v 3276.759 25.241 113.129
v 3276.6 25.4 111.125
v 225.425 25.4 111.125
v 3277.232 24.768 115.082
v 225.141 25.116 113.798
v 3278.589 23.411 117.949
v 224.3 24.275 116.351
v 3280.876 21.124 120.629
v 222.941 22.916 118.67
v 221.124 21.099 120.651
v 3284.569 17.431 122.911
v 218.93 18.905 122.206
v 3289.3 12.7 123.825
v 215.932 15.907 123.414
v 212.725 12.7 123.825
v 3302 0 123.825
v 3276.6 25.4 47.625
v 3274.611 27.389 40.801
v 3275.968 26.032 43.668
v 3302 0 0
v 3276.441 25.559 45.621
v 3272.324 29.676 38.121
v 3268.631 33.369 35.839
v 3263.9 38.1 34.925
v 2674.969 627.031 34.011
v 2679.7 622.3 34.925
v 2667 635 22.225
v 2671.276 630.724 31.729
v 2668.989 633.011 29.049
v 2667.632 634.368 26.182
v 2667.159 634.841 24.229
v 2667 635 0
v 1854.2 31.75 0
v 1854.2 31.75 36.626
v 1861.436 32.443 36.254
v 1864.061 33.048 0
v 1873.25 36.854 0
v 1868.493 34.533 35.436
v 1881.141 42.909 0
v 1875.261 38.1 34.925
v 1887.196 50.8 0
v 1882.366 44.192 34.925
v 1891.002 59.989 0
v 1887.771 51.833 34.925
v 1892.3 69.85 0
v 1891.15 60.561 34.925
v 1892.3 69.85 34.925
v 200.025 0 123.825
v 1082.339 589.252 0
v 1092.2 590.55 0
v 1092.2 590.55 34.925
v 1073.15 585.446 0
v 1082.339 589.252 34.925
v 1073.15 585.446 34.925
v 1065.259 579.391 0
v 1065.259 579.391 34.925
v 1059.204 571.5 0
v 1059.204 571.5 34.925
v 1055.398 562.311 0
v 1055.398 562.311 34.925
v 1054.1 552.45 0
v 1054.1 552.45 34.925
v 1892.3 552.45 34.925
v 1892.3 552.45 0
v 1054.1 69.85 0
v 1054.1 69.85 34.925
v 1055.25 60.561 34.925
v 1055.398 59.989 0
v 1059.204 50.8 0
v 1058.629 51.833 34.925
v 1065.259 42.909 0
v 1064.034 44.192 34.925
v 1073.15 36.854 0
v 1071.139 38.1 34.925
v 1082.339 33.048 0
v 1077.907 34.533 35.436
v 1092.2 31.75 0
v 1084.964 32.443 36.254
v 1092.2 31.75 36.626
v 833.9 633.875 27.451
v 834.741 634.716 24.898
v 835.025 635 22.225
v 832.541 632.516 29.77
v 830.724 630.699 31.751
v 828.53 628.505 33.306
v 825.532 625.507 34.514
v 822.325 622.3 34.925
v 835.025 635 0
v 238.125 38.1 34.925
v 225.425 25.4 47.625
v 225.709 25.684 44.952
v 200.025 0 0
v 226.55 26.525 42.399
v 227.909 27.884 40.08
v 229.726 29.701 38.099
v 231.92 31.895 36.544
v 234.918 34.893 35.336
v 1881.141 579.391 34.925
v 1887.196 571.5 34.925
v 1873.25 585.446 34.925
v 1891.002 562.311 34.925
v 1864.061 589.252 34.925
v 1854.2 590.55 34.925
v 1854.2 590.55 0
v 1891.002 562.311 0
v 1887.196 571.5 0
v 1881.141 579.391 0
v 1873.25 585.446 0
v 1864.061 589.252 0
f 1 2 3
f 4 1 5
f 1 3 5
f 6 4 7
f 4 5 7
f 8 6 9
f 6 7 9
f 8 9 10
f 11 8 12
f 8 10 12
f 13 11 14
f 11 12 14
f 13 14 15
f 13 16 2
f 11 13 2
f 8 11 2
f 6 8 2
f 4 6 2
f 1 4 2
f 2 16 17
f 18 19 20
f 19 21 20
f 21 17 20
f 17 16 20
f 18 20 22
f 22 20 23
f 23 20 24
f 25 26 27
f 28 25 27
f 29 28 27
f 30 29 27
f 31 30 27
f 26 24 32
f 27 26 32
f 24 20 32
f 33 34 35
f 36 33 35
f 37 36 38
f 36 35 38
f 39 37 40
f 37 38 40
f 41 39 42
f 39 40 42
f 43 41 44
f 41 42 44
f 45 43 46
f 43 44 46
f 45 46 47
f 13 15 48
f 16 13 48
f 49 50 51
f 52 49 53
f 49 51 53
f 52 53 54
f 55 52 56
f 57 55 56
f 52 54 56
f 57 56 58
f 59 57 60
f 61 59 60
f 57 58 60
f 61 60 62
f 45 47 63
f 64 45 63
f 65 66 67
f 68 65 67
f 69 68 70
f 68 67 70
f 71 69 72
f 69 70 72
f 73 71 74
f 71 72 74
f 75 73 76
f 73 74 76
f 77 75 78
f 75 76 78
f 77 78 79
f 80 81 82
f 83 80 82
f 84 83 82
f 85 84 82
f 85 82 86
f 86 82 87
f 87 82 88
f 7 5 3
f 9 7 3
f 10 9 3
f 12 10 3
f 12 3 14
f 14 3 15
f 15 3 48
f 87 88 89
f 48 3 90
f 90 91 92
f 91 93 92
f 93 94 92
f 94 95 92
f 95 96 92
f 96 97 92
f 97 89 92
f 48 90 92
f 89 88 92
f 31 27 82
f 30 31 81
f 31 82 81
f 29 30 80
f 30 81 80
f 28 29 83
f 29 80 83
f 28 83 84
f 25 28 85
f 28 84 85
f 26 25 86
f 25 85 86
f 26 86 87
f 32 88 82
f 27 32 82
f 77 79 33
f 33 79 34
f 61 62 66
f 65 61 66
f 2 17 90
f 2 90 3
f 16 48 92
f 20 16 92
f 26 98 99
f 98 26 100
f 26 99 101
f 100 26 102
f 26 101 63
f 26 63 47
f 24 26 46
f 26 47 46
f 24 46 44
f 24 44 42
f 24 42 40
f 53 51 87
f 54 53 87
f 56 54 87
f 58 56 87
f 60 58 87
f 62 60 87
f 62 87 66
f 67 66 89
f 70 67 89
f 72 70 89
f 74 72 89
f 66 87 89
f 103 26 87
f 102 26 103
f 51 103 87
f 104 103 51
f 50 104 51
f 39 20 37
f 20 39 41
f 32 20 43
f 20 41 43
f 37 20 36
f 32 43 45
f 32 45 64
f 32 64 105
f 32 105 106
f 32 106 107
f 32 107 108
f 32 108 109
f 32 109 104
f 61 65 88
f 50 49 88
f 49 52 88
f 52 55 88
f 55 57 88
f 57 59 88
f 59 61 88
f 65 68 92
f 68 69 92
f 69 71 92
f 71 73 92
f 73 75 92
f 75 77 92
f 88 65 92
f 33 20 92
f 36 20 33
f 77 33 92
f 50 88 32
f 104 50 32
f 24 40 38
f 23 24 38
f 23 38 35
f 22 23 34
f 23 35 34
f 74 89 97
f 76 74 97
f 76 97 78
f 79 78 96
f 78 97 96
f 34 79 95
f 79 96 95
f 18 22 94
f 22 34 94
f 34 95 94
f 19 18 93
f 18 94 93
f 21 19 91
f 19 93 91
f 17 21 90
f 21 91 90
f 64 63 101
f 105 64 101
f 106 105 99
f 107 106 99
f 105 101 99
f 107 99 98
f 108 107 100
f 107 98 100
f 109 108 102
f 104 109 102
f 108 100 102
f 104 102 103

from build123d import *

# Parameters (mm, degrees)
F1_DEPTH = 3302
F3_DEPTH = 254
F5_DEPTH = 127
F6_DEPTH = 254


with BuildPart() as f1:
    # F0 (on Right) → F1 (new body)
    with BuildSketch(Plane.YZ):
        with BuildLine():
            Line((0, 34.925), (0, 0))
            Line((0, 0), (635, 0))
            Line((635, 0), (635, 22.225))
            ThreePointArc((635, 22.225), (631.280256, 31.205256), (622.3, 34.925))
            Line((622.3, 34.925), (38.1, 34.925))
            ThreePointArc((38.1, 34.925), (29.119744, 38.644744), (25.4, 47.625))
            Line((25.4, 47.625), (25.4, 111.125))
            ThreePointArc((25.4, 111.125), (21.680256, 120.105256), (12.7, 123.825))
            Line((12.7, 123.825), (0, 123.825))
            Line((0, 123.825), (0, 34.925))
        make_face()
    extrude(amount=F1_DEPTH)

    # F2 (on face) → F3 (cut)
    with BuildSketch(Plane(origin=(0, 0, 0), x_dir=(1, 0, 0), z_dir=(0, 0, -1))):
        Polygon((3302, -635), (3302, 0), (2667, -635), align=None)
        Polygon((0, -635), (835.025, -635), (200.025, 0), (0, 0), align=None)
    extrude(amount=-F3_DEPTH, mode=Mode.SUBTRACT)

    # F4 (on face) → F5 (cut)
    with BuildSketch(Plane.XY.offset(34.925)):
        with BuildLine():
            Line((1092.2, 31.75), (1854.2, 31.75))
            ThreePointArc((1854.2, 31.75), (1881.140768, 42.909232), (1892.3, 69.85))
            Line((1892.3, 69.85), (1892.3, 552.45))
            ThreePointArc((1892.3, 552.45), (1881.140768, 579.390768), (1854.2, 590.55))
            Line((1854.2, 590.55), (1092.2, 590.55))
            ThreePointArc((1092.2, 590.55), (1065.259232, 579.390768), (1054.1, 552.45))
            Line((1054.1, 552.45), (1054.1, 69.85))
            ThreePointArc((1054.1, 69.85), (1065.259232, 42.909232), (1092.2, 31.75))
        make_face()
    extrude(amount=-F5_DEPTH, mode=Mode.SUBTRACT)

    # F4 (on face) → F6 (cut)
    with BuildSketch(Plane.XY.offset(34.925)):
        with BuildLine():
            Line((1092.2, 31.75), (1854.2, 31.75))
            ThreePointArc((1854.2, 31.75), (1881.140768, 42.909232), (1892.3, 69.85))
            Line((1892.3, 69.85), (1892.3, 552.45))
            ThreePointArc((1892.3, 552.45), (1881.140768, 579.390768), (1854.2, 590.55))
            Line((1854.2, 590.55), (1092.2, 590.55))
            ThreePointArc((1092.2, 590.55), (1065.259232, 579.390768), (1054.1, 552.45))
            Line((1054.1, 552.45), (1054.1, 69.85))
            ThreePointArc((1054.1, 69.85), (1065.259232, 42.909232), (1092.2, 31.75))
        make_face()
    extrude(amount=F6_DEPTH, mode=Mode.SUBTRACT)


solid = f1.part
